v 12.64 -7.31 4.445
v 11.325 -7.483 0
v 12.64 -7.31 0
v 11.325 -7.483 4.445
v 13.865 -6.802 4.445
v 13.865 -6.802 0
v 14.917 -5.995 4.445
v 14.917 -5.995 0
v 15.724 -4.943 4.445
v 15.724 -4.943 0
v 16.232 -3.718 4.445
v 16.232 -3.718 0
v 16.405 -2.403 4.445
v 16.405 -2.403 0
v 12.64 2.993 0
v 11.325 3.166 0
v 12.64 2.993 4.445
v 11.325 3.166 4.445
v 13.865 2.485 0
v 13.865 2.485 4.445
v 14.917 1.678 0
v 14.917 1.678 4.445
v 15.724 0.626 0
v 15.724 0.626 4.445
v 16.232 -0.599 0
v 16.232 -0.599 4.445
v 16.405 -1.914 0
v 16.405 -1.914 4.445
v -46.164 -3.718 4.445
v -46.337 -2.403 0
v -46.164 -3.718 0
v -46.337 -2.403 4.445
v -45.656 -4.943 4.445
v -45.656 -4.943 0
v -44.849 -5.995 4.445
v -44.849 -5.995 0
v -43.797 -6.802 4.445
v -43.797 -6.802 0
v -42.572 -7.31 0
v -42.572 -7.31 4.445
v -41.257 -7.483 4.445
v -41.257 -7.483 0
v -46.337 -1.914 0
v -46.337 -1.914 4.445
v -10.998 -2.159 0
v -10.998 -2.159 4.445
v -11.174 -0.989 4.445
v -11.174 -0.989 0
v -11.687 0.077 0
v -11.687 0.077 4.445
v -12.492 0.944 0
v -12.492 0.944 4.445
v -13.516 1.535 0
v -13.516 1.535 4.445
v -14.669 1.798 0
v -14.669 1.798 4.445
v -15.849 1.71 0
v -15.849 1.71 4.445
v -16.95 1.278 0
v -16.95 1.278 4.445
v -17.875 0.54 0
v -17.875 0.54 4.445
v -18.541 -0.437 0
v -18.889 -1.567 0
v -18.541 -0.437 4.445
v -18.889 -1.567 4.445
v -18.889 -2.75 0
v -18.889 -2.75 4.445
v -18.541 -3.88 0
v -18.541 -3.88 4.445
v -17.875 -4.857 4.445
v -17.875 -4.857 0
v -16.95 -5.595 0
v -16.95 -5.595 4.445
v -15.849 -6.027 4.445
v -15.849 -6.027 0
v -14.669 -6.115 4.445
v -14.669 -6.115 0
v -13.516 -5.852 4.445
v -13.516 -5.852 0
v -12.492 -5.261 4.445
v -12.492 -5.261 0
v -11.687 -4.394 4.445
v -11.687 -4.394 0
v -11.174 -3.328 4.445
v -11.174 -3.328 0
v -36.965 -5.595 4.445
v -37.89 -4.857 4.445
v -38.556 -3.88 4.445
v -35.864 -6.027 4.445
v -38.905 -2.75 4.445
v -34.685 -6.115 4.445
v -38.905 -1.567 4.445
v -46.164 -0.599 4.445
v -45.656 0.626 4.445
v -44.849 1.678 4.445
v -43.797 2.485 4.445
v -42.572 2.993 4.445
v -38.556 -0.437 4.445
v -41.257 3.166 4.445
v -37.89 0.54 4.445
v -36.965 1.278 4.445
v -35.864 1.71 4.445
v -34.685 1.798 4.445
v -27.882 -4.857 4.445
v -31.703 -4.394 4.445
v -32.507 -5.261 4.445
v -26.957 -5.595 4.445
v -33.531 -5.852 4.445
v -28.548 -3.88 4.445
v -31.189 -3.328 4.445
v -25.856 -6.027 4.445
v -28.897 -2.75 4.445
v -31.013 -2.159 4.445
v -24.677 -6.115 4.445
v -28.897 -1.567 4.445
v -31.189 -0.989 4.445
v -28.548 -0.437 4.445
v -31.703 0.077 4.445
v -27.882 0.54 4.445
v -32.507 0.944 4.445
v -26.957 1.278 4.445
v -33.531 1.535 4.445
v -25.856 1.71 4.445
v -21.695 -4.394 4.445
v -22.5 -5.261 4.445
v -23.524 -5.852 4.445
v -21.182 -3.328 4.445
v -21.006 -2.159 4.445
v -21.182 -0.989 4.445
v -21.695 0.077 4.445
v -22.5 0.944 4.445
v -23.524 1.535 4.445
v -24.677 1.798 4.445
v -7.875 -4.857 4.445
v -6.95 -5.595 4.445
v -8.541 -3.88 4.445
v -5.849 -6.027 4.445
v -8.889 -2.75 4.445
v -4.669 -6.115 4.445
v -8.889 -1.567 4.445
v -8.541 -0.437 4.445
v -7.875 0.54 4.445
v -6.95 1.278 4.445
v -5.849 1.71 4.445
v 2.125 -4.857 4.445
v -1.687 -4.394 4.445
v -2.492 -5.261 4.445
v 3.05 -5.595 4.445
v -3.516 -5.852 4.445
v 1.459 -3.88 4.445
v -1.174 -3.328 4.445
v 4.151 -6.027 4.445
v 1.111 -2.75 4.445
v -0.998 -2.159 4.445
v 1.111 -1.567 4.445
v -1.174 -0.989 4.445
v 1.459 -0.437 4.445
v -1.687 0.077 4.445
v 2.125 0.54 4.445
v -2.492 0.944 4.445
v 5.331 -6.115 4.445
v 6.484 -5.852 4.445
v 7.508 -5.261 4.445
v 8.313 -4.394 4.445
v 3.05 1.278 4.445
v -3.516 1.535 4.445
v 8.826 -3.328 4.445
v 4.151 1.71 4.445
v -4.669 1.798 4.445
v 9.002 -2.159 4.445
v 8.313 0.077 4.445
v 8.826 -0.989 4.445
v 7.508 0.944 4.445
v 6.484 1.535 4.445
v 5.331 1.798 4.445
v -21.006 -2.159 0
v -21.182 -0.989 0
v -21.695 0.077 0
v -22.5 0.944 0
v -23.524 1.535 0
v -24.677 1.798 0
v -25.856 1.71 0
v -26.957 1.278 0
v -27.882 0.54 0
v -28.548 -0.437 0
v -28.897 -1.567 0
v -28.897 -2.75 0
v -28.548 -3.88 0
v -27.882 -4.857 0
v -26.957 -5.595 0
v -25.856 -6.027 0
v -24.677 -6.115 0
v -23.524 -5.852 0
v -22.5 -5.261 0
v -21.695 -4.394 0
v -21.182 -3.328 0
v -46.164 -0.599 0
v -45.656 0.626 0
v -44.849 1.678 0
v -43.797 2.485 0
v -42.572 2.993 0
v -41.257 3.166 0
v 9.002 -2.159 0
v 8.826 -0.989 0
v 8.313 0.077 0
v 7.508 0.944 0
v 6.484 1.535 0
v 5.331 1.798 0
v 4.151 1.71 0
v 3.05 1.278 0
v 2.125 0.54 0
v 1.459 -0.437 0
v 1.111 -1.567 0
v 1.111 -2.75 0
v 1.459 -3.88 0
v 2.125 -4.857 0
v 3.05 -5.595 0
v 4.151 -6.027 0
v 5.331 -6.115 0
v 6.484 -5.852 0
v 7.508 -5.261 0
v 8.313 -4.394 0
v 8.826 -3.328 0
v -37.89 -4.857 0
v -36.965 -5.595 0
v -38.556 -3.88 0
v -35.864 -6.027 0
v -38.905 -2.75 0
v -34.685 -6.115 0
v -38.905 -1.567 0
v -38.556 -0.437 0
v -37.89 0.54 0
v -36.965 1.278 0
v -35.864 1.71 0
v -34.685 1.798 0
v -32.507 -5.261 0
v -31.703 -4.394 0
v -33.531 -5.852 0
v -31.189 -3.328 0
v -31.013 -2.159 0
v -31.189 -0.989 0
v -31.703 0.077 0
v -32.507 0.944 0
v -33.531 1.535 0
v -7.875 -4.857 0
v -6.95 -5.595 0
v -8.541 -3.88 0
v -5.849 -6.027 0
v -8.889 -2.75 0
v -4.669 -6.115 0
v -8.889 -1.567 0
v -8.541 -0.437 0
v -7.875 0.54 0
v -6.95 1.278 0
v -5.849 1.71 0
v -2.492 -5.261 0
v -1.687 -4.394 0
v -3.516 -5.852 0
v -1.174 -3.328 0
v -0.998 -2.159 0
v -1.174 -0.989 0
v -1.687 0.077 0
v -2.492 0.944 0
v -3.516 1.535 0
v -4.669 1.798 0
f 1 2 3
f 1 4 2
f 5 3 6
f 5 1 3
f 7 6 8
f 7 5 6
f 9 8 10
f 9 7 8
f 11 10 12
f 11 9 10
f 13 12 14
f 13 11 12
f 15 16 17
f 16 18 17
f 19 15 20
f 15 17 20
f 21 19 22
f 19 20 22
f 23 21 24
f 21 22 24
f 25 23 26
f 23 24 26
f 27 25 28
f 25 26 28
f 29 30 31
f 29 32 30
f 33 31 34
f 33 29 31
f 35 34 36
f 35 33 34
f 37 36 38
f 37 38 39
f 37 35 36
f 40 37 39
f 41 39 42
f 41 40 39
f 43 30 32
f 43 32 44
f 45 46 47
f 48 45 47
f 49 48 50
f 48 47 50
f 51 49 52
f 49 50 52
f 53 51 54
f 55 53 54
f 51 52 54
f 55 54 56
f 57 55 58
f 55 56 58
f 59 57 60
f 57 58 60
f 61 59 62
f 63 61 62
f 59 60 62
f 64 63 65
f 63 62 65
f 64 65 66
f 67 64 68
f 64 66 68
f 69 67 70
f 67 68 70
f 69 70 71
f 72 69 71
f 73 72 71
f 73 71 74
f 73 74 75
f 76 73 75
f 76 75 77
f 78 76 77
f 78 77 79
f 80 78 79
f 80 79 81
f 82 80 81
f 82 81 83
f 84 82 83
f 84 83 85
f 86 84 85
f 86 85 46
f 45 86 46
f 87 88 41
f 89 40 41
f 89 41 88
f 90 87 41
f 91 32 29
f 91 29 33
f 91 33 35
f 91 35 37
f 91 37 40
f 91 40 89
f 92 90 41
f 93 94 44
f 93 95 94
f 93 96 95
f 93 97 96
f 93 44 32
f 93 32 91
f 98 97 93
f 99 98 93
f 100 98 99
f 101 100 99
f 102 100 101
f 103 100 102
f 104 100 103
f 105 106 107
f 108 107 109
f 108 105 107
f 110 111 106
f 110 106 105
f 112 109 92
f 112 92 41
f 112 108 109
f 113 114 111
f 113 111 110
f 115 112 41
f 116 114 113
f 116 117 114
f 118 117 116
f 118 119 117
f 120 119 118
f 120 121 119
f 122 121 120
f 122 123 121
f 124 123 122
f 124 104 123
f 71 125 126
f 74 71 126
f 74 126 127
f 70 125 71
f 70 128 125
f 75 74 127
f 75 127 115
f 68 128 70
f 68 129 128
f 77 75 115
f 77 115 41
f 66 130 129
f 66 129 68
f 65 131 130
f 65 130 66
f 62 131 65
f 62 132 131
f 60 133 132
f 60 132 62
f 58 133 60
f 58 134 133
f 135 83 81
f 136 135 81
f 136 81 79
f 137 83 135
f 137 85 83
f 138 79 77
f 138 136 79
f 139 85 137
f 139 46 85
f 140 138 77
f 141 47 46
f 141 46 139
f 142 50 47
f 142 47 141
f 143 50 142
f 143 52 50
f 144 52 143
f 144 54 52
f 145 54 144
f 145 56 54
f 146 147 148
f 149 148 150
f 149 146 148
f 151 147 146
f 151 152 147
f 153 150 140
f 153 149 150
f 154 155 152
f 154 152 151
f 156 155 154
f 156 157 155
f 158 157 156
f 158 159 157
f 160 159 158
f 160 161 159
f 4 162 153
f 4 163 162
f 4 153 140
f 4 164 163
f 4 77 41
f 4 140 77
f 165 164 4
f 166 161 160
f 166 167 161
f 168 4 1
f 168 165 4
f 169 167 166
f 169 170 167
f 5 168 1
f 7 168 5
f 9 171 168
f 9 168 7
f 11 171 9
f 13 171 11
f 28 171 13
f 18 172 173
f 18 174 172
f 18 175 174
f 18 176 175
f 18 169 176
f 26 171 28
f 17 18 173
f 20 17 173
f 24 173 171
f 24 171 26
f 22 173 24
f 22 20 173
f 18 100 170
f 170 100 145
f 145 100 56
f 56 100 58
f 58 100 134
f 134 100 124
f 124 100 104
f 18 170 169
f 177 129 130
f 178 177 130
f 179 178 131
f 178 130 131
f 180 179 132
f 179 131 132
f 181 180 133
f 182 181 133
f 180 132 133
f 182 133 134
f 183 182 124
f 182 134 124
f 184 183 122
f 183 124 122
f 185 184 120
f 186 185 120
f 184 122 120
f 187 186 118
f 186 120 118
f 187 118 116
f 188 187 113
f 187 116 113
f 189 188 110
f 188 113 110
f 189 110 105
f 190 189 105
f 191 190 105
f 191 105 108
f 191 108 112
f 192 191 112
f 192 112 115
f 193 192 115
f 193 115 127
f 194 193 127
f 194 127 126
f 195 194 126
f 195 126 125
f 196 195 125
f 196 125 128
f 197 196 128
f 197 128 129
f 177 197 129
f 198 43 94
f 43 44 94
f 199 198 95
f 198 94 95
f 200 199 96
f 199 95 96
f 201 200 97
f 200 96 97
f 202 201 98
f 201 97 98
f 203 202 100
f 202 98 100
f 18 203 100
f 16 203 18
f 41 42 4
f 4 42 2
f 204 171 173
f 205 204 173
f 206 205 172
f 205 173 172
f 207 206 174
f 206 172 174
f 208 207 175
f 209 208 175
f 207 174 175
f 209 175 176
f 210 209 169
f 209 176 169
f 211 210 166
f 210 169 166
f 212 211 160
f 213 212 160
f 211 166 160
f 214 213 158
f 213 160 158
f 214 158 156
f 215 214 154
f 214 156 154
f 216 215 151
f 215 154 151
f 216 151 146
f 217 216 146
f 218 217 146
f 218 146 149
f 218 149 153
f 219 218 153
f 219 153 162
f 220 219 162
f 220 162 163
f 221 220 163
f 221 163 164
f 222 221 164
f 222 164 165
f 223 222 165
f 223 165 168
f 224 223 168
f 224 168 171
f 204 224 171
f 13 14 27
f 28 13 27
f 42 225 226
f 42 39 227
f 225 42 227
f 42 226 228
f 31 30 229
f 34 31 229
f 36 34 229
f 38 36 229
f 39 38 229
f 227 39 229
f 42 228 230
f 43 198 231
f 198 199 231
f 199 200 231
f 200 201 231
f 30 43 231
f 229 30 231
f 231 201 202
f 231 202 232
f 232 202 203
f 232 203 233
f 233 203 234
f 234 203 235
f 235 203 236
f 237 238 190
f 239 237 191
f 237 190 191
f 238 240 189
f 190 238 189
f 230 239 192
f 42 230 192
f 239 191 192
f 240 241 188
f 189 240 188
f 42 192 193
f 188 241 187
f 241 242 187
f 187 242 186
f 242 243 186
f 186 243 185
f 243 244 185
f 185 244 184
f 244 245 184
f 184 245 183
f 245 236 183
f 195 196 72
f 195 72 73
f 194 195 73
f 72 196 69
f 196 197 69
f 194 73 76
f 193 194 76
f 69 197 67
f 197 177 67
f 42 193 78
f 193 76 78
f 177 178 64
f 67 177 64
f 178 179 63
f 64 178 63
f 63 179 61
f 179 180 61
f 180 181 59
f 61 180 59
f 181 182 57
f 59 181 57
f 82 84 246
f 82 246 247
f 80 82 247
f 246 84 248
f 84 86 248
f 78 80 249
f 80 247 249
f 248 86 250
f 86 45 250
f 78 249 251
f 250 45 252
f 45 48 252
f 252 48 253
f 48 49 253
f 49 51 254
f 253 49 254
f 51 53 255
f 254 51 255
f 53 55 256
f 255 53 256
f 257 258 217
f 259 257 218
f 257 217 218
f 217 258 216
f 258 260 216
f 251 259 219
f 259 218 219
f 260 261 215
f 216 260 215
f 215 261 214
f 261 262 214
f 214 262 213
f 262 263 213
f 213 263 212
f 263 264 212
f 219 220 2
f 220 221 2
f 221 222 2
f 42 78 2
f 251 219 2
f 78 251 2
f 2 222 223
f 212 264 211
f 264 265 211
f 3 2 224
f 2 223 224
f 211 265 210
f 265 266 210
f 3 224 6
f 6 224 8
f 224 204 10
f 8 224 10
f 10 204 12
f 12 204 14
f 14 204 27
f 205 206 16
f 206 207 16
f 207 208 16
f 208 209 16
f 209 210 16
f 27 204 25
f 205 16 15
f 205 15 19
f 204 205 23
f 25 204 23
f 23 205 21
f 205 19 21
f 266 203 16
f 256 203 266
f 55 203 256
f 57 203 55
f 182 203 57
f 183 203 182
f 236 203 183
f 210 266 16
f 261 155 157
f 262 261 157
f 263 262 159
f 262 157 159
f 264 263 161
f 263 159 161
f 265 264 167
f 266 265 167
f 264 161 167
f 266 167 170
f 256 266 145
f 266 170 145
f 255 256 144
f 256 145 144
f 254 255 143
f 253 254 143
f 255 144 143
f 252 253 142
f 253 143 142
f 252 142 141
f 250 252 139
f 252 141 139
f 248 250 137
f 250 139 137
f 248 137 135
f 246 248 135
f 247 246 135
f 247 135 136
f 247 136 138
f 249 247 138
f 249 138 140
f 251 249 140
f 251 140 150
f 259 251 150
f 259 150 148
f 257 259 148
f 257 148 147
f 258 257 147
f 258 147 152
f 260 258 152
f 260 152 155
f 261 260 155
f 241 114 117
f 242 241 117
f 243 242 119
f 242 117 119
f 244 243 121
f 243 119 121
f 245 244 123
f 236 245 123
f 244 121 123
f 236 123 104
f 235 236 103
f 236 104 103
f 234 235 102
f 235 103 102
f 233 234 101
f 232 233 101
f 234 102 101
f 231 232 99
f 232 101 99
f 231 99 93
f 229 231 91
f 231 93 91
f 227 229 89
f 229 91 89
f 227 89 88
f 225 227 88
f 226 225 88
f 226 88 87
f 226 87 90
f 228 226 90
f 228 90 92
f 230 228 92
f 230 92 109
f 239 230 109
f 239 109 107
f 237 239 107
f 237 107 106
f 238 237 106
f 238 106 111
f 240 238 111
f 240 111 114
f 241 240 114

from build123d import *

# Parameters (mm, degrees)
F0_W     = 62.741658
F0_H     = 10.648813
F1_DEPTH = 4.445
F2_R     = 3.967882
F3_DEPTH = 4.446
F4_R     = 5.08
F5_R     = 5.08


with BuildPart() as f1:
    # F0 (on Top) → F1 (new body)
    with BuildSketch(Plane.XY):
        with Locations((-14.9659, -2.158543)):
            Rectangle(F0_W, F0_H)
    extrude(amount=F1_DEPTH)

    # F2 (on face) → F3 (cut, through all)
    with BuildSketch(Plane.XY.offset(4.445)):
        with Locations((-34.9811, -2.158543)):
            Circle(F2_R)
        with Locations((5.0341, -2.158543)):
            Circle(F2_R)
        with Locations((-24.9735, -2.158543)):
            Circle(F2_R)
        with Locations((-14.9659, -2.158543)):
            Circle(F2_R)
        with Locations((-4.9659, -2.158543)):
            Circle(F2_R)
    extrude(amount=-F3_DEPTH, mode=Mode.SUBTRACT)

    # F4
    f4_edges = [f1.edges().sort_by_distance(p)[0] for p in [
        (-46.336729, 3.165863, 2.2225),
        (-46.336729, -7.48295, 2.2225),
    ]]
    fillet(f4_edges, radius=F4_R)

    # F5
    f5_edges = [f1.edges().sort_by_distance(p)[0] for p in [
        (16.404929, -7.48295, 2.2225),
        (16.404929, 3.165863, 2.2225),
    ]]
    fillet(f5_edges, radius=F5_R)


solid = f1.part
